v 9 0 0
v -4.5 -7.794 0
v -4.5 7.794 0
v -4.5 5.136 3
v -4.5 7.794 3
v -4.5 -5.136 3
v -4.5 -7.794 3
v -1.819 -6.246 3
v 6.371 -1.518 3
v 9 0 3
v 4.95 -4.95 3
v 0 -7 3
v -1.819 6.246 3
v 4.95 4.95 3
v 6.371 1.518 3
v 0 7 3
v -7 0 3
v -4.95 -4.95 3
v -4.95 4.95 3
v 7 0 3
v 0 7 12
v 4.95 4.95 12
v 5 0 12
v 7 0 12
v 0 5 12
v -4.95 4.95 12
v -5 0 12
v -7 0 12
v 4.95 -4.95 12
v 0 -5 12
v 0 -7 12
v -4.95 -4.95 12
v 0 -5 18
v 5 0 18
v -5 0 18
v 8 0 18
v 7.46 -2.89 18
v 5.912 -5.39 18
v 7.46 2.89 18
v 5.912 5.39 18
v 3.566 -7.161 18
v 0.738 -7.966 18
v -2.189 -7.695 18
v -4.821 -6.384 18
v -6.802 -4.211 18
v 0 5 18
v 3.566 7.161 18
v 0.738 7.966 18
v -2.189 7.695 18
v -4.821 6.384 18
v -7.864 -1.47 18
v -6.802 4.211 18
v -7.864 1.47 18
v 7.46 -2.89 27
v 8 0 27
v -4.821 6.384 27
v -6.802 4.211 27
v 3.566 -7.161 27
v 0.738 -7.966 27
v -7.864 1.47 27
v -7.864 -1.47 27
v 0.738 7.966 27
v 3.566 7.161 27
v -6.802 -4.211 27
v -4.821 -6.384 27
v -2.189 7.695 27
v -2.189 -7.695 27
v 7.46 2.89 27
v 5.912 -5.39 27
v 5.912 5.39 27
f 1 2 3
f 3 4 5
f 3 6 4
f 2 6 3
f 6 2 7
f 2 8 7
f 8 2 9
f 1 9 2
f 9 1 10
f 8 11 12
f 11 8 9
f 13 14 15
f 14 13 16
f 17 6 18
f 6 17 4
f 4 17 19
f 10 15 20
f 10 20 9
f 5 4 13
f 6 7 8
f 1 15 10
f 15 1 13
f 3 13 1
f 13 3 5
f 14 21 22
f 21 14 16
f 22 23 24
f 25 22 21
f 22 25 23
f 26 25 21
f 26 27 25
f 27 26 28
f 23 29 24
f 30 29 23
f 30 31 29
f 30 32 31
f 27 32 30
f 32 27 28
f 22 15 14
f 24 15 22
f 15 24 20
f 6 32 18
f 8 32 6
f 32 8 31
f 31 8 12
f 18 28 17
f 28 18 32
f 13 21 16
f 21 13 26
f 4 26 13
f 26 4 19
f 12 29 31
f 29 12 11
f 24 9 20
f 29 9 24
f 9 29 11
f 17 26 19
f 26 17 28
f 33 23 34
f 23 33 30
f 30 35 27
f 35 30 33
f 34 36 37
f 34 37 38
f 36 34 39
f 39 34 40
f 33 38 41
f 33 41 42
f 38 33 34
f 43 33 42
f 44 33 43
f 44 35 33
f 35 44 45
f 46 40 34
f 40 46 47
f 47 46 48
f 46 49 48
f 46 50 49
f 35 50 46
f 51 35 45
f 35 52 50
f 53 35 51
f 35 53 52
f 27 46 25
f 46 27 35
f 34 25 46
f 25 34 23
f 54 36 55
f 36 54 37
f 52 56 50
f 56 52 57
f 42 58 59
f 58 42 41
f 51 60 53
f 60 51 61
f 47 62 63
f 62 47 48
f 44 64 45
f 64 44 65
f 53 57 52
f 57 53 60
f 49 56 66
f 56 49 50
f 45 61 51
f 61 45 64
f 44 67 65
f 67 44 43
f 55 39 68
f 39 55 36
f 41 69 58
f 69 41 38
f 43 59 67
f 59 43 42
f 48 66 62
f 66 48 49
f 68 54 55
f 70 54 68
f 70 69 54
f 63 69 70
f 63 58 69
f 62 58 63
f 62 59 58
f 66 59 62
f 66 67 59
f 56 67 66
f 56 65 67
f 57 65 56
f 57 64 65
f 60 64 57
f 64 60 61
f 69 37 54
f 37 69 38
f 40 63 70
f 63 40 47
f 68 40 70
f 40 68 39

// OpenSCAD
// [inibitore, raggio, facce, altezza]
genome = [1,9,3,3,0,5,5,6,1,7,8,9,1,5,4,6,0,7,3,4,0,4,7,8,1,8,17,9];
gene_len=4;
function altezz(index) = ( index == 0 ? 0 : genome[index-gene_len]*genome[index-1] + altezz(index-gene_len) ); 

for (g=[0:gene_len:len(genome)-gene_len]){
    
    echo (altezz(g));

    inibitore = genome[g];
    raggio = genome[g+1];
    facce = genome[g+2];
    altezza = genome[g+3];
    if(inibitore==1){ 
        // echo(genome[g], genome[g+1], genome[g+2]);
        translate([0,0,altezz(g)])
            linear_extrude(height = altezza)
                circle(raggio,$fn=facce);
    }

}
